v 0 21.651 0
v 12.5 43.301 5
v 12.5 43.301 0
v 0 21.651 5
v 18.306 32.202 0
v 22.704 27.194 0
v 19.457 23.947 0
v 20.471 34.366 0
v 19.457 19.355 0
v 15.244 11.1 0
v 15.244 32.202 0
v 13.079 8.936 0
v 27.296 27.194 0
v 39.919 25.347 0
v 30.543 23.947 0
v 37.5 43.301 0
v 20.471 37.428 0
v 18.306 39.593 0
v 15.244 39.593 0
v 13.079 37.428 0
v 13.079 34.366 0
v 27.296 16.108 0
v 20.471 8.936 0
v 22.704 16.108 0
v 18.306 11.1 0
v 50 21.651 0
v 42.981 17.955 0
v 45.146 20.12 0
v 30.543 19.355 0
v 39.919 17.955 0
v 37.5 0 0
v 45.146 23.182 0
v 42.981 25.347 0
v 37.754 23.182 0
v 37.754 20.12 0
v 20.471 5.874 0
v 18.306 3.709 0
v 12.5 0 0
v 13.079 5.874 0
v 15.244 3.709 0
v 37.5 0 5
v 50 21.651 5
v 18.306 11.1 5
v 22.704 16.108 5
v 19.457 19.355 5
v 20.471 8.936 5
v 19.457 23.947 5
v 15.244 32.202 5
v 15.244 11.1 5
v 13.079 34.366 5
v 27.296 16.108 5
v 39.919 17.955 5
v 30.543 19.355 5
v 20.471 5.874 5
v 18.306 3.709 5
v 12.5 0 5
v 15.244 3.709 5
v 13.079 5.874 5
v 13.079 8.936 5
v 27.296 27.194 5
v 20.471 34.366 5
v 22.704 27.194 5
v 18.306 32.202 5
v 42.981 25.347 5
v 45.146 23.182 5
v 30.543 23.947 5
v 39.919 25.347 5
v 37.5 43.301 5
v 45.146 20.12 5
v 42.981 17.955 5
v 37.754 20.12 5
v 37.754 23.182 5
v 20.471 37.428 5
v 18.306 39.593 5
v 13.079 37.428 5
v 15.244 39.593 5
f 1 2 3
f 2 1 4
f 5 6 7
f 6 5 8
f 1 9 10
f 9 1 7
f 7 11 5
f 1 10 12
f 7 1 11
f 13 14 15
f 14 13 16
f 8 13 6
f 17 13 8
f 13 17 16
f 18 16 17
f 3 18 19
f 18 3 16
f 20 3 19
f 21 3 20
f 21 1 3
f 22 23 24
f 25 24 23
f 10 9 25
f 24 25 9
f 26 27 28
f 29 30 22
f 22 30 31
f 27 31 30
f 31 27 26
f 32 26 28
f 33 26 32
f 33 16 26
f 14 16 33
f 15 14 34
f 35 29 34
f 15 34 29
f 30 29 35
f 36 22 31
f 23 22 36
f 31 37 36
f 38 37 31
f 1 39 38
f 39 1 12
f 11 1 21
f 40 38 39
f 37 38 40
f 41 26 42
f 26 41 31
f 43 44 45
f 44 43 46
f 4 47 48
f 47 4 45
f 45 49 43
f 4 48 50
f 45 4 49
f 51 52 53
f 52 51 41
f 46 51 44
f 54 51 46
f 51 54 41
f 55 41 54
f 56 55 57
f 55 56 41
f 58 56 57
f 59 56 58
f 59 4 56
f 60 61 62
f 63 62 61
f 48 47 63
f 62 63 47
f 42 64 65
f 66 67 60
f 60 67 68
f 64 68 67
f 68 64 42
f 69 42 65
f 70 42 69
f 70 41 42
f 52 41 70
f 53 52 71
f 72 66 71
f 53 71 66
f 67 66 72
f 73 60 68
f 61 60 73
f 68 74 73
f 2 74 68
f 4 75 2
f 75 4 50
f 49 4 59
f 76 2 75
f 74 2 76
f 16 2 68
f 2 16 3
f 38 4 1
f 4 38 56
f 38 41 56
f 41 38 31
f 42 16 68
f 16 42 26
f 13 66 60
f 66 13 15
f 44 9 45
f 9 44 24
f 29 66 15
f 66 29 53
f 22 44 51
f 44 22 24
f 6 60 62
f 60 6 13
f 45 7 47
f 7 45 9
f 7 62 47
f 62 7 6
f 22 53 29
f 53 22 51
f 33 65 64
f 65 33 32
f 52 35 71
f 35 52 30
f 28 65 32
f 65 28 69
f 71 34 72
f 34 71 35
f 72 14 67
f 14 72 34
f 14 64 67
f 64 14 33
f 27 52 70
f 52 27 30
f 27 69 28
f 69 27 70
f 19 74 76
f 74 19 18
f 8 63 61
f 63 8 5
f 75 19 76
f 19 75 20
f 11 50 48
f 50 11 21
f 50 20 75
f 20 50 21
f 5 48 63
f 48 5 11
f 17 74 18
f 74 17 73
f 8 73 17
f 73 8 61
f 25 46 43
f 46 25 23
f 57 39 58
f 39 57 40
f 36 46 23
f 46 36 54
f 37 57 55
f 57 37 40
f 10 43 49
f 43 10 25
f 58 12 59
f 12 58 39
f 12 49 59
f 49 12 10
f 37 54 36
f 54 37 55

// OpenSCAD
$fn = 32;

// ----------------------------------------------------------------------
// Polygon plate: 6-gon R25, 3 bolt windows
// ----------------------------------------------------------------------

// --- parameters (mm) ---
sides = 6;                // number of polygon sides
plate_r = 25;             // circumscribed radius of the polygon
bore_r = 6;               // centre bore radius
bolts = 3;                // number of bolt windows
ring_r = 16.45;           // bolt-circle radius
bolt_r = 4;               // bolt window radius
plate_t = 5;              // plate thickness, Z (extrusion height)

plate_d = 2 * plate_r;  // circumscribed diameter
bore_d = 2 * bore_r;  // centre bore diameter
bolt_d = 2 * bolt_r;  // bolt window diameter
ring_d = 2 * ring_r;  // bolt-circle diameter

profile = [[50, 21.651], [37.5, 43.301], [12.5, 43.301], [0, 21.651], [12.5, 0], [37.5, 0]];  // primary outline, 6 points, counter clockwise
void_1 = [[30.543, 23.947], [27.296, 27.194], [22.704, 27.194], [19.457, 23.947], [19.457, 19.355], [22.704, 16.108], [27.296, 16.108], [30.543, 19.355]];  // centre bore, 8 points
void_2 = [[45.146, 23.182], [42.981, 25.347], [39.919, 25.347], [37.754, 23.182], [37.754, 20.12], [39.919, 17.955], [42.981, 17.955], [45.146, 20.12]];  // bolt window 1, 8 points
void_3 = [[20.471, 37.428], [18.306, 39.593], [15.244, 39.593], [13.079, 37.428], [13.079, 34.366], [15.244, 32.202], [18.306, 32.202], [20.471, 34.366]];  // bolt window 2, 8 points
void_4 = [[20.471, 8.936], [18.306, 11.1], [15.244, 11.1], [13.079, 8.936], [13.079, 5.874], [15.244, 3.709], [18.306, 3.709], [20.471, 5.874]];  // bolt window 3, 8 points

// --- the one profile operation ---
difference() {
  linear_extrude(height = plate_t) polygon(points = profile);
  translate([0, 0, -1])
    linear_extrude(height = plate_t + 2) polygon(points = void_1);
  translate([0, 0, -1])
    linear_extrude(height = plate_t + 2) polygon(points = void_2);
  translate([0, 0, -1])
    linear_extrude(height = plate_t + 2) polygon(points = void_3);
  translate([0, 0, -1])
    linear_extrude(height = plate_t + 2) polygon(points = void_4);
}
